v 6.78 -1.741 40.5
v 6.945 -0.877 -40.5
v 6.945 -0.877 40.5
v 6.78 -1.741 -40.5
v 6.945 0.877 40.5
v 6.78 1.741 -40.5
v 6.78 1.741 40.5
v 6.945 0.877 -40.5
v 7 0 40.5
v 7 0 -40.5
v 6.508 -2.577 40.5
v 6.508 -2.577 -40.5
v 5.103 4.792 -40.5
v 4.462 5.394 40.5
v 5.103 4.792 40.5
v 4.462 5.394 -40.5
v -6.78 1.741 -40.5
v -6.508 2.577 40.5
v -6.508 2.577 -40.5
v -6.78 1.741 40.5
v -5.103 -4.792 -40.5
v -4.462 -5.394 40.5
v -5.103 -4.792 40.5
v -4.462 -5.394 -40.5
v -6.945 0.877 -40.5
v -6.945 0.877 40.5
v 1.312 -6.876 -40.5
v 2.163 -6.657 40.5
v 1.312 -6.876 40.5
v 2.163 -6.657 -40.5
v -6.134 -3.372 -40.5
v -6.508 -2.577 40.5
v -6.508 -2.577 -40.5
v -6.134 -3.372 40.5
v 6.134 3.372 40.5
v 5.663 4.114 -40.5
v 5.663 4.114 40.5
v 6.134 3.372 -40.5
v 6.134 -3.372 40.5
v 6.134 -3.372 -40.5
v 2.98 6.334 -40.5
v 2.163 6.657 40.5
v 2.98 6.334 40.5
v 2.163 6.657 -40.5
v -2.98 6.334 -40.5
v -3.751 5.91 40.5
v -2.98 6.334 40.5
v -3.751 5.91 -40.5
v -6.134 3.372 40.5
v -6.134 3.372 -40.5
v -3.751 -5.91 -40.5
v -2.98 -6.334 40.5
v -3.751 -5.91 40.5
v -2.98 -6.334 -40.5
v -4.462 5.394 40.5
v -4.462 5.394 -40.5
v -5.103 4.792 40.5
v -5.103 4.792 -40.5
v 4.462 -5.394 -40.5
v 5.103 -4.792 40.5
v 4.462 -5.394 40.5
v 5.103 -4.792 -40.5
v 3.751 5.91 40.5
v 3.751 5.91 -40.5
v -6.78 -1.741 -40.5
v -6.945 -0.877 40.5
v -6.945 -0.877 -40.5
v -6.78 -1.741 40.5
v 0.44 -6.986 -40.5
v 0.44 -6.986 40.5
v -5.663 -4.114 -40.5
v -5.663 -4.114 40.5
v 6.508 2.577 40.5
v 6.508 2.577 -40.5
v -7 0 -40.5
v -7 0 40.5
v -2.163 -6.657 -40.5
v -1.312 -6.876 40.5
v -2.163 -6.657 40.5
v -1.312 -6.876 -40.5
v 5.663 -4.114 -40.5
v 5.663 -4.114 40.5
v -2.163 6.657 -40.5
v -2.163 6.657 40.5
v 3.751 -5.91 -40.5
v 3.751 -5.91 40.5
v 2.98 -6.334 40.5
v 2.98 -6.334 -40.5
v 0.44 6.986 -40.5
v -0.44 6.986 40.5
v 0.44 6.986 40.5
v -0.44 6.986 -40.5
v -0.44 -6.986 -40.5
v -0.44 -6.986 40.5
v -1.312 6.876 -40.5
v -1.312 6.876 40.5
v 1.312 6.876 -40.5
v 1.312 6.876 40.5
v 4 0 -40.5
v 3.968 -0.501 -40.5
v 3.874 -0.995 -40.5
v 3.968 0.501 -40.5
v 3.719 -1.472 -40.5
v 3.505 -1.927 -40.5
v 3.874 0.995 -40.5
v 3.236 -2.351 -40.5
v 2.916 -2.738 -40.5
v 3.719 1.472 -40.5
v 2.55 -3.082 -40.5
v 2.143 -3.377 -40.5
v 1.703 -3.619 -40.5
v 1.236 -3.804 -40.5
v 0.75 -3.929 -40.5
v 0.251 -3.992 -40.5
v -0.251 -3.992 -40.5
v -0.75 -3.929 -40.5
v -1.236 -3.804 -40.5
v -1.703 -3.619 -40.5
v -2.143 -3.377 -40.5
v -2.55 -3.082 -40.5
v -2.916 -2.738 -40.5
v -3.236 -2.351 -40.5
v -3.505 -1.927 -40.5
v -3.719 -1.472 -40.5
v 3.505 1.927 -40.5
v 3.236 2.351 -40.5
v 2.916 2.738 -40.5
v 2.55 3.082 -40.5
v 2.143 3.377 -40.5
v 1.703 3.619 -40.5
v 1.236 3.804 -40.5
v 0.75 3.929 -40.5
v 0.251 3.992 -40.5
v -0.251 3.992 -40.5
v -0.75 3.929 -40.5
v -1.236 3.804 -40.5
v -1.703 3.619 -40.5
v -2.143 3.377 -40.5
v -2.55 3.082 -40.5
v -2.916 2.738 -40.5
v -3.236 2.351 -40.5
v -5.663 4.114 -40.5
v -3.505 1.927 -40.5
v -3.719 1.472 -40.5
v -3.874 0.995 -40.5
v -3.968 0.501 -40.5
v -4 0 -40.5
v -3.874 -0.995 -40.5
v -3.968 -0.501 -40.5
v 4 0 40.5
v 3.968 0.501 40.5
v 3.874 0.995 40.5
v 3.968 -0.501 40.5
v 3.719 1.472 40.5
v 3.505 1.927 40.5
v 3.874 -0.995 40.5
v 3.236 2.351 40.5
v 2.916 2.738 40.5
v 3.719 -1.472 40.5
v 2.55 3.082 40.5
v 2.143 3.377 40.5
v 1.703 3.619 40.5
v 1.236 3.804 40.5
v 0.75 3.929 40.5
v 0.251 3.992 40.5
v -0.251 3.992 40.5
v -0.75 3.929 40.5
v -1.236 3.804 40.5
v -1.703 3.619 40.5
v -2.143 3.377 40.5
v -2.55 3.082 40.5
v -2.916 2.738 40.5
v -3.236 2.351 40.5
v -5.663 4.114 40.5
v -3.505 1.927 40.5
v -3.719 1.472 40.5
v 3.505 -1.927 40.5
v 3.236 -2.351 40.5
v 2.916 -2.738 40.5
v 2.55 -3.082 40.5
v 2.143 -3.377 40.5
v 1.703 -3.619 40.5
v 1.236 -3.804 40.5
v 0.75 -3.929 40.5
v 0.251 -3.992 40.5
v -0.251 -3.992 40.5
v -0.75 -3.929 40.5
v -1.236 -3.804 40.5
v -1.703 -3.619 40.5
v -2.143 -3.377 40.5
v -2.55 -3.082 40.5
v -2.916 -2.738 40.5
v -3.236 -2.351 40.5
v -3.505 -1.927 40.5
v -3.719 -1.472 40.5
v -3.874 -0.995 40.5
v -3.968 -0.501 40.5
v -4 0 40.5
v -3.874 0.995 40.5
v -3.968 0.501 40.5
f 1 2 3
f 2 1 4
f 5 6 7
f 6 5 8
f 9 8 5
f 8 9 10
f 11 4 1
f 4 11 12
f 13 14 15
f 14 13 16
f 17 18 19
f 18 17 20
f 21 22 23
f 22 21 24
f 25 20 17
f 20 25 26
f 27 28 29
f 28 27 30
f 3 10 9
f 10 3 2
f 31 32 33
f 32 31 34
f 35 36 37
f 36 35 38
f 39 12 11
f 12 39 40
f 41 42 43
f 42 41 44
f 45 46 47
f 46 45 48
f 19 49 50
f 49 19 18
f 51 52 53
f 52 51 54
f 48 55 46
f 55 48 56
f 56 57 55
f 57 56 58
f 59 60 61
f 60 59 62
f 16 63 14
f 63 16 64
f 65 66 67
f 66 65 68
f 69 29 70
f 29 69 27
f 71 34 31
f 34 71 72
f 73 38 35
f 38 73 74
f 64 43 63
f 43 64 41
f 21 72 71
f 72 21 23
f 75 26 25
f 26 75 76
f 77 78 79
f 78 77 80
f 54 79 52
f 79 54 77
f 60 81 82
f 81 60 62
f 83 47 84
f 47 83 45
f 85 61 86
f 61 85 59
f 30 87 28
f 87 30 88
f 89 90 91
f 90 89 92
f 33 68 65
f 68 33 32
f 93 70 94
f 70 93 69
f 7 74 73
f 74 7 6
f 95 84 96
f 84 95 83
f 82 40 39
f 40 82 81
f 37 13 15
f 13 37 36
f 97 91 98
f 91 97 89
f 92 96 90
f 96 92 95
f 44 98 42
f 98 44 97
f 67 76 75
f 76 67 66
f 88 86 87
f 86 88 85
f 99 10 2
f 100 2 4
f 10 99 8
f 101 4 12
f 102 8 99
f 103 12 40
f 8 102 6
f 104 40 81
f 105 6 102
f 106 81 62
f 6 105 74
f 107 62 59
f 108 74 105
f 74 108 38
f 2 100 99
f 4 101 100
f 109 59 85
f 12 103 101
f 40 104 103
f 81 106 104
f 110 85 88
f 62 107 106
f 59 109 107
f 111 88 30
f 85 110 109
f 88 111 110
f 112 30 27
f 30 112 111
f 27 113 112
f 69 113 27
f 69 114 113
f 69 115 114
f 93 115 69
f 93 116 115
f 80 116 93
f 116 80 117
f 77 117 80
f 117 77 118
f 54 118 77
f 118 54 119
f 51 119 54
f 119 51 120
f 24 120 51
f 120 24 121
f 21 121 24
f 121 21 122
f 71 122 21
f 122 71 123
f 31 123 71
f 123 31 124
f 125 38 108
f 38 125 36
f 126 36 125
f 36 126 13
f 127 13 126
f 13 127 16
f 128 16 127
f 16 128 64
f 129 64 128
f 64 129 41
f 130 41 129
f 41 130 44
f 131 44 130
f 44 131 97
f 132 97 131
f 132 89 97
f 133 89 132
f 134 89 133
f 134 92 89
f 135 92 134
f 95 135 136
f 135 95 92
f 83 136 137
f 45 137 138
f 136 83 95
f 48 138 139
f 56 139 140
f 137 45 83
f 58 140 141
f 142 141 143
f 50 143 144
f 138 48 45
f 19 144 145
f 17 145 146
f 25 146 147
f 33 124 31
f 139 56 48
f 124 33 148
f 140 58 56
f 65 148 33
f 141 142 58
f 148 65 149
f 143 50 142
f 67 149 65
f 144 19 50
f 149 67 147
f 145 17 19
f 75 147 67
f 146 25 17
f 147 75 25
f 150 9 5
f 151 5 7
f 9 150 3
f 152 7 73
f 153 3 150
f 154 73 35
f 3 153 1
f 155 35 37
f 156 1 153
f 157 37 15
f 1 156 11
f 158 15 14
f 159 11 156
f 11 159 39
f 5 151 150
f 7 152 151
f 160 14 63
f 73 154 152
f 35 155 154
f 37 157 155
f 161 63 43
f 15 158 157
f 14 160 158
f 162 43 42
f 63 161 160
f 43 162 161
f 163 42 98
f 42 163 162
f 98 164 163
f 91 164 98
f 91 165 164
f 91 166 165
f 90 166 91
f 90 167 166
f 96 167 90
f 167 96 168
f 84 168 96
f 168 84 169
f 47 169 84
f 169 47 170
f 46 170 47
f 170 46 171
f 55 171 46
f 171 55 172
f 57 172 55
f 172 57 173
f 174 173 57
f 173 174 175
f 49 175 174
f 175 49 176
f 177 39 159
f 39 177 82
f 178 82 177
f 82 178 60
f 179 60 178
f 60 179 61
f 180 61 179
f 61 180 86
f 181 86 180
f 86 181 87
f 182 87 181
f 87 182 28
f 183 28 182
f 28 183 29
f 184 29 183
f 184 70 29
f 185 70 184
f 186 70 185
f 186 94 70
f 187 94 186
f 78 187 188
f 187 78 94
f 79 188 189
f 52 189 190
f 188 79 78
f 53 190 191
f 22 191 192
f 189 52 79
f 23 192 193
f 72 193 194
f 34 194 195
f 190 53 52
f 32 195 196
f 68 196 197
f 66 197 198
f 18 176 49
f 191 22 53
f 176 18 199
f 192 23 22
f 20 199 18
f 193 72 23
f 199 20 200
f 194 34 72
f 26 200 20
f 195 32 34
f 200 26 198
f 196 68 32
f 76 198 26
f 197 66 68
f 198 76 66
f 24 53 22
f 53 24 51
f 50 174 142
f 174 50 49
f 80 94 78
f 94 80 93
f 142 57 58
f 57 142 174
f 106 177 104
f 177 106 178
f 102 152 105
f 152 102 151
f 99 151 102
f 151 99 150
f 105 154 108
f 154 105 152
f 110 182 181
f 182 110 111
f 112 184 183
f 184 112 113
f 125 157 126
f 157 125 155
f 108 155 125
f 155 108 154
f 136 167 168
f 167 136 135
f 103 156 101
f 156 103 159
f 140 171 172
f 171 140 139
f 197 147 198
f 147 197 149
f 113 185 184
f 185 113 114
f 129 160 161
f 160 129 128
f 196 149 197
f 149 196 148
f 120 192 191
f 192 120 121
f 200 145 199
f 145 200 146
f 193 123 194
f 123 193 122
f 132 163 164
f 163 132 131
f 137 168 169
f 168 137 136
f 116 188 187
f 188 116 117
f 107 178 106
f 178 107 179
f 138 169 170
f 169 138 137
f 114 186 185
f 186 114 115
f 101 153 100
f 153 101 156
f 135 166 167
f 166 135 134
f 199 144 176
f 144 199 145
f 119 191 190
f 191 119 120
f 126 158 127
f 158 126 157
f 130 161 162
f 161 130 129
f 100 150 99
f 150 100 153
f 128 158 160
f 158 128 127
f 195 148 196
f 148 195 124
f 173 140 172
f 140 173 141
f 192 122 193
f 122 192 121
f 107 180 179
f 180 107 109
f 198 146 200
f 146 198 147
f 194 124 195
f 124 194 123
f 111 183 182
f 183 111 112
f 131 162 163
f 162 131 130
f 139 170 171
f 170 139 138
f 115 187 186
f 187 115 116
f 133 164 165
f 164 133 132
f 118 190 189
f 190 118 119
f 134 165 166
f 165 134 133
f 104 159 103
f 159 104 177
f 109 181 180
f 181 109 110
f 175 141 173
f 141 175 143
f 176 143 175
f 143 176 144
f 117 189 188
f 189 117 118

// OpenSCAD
$fn = 50;


difference() {
	union() {
		translate(v = [0, 0, -40.5000000000]) {
			cylinder(h = 81, r = 7.0000000000);
		}
	}
	union() {
		translate(v = [0, 0, -100.0000000000]) {
			cylinder(h = 200, r = 4.0000000000);
		}
	}
}
